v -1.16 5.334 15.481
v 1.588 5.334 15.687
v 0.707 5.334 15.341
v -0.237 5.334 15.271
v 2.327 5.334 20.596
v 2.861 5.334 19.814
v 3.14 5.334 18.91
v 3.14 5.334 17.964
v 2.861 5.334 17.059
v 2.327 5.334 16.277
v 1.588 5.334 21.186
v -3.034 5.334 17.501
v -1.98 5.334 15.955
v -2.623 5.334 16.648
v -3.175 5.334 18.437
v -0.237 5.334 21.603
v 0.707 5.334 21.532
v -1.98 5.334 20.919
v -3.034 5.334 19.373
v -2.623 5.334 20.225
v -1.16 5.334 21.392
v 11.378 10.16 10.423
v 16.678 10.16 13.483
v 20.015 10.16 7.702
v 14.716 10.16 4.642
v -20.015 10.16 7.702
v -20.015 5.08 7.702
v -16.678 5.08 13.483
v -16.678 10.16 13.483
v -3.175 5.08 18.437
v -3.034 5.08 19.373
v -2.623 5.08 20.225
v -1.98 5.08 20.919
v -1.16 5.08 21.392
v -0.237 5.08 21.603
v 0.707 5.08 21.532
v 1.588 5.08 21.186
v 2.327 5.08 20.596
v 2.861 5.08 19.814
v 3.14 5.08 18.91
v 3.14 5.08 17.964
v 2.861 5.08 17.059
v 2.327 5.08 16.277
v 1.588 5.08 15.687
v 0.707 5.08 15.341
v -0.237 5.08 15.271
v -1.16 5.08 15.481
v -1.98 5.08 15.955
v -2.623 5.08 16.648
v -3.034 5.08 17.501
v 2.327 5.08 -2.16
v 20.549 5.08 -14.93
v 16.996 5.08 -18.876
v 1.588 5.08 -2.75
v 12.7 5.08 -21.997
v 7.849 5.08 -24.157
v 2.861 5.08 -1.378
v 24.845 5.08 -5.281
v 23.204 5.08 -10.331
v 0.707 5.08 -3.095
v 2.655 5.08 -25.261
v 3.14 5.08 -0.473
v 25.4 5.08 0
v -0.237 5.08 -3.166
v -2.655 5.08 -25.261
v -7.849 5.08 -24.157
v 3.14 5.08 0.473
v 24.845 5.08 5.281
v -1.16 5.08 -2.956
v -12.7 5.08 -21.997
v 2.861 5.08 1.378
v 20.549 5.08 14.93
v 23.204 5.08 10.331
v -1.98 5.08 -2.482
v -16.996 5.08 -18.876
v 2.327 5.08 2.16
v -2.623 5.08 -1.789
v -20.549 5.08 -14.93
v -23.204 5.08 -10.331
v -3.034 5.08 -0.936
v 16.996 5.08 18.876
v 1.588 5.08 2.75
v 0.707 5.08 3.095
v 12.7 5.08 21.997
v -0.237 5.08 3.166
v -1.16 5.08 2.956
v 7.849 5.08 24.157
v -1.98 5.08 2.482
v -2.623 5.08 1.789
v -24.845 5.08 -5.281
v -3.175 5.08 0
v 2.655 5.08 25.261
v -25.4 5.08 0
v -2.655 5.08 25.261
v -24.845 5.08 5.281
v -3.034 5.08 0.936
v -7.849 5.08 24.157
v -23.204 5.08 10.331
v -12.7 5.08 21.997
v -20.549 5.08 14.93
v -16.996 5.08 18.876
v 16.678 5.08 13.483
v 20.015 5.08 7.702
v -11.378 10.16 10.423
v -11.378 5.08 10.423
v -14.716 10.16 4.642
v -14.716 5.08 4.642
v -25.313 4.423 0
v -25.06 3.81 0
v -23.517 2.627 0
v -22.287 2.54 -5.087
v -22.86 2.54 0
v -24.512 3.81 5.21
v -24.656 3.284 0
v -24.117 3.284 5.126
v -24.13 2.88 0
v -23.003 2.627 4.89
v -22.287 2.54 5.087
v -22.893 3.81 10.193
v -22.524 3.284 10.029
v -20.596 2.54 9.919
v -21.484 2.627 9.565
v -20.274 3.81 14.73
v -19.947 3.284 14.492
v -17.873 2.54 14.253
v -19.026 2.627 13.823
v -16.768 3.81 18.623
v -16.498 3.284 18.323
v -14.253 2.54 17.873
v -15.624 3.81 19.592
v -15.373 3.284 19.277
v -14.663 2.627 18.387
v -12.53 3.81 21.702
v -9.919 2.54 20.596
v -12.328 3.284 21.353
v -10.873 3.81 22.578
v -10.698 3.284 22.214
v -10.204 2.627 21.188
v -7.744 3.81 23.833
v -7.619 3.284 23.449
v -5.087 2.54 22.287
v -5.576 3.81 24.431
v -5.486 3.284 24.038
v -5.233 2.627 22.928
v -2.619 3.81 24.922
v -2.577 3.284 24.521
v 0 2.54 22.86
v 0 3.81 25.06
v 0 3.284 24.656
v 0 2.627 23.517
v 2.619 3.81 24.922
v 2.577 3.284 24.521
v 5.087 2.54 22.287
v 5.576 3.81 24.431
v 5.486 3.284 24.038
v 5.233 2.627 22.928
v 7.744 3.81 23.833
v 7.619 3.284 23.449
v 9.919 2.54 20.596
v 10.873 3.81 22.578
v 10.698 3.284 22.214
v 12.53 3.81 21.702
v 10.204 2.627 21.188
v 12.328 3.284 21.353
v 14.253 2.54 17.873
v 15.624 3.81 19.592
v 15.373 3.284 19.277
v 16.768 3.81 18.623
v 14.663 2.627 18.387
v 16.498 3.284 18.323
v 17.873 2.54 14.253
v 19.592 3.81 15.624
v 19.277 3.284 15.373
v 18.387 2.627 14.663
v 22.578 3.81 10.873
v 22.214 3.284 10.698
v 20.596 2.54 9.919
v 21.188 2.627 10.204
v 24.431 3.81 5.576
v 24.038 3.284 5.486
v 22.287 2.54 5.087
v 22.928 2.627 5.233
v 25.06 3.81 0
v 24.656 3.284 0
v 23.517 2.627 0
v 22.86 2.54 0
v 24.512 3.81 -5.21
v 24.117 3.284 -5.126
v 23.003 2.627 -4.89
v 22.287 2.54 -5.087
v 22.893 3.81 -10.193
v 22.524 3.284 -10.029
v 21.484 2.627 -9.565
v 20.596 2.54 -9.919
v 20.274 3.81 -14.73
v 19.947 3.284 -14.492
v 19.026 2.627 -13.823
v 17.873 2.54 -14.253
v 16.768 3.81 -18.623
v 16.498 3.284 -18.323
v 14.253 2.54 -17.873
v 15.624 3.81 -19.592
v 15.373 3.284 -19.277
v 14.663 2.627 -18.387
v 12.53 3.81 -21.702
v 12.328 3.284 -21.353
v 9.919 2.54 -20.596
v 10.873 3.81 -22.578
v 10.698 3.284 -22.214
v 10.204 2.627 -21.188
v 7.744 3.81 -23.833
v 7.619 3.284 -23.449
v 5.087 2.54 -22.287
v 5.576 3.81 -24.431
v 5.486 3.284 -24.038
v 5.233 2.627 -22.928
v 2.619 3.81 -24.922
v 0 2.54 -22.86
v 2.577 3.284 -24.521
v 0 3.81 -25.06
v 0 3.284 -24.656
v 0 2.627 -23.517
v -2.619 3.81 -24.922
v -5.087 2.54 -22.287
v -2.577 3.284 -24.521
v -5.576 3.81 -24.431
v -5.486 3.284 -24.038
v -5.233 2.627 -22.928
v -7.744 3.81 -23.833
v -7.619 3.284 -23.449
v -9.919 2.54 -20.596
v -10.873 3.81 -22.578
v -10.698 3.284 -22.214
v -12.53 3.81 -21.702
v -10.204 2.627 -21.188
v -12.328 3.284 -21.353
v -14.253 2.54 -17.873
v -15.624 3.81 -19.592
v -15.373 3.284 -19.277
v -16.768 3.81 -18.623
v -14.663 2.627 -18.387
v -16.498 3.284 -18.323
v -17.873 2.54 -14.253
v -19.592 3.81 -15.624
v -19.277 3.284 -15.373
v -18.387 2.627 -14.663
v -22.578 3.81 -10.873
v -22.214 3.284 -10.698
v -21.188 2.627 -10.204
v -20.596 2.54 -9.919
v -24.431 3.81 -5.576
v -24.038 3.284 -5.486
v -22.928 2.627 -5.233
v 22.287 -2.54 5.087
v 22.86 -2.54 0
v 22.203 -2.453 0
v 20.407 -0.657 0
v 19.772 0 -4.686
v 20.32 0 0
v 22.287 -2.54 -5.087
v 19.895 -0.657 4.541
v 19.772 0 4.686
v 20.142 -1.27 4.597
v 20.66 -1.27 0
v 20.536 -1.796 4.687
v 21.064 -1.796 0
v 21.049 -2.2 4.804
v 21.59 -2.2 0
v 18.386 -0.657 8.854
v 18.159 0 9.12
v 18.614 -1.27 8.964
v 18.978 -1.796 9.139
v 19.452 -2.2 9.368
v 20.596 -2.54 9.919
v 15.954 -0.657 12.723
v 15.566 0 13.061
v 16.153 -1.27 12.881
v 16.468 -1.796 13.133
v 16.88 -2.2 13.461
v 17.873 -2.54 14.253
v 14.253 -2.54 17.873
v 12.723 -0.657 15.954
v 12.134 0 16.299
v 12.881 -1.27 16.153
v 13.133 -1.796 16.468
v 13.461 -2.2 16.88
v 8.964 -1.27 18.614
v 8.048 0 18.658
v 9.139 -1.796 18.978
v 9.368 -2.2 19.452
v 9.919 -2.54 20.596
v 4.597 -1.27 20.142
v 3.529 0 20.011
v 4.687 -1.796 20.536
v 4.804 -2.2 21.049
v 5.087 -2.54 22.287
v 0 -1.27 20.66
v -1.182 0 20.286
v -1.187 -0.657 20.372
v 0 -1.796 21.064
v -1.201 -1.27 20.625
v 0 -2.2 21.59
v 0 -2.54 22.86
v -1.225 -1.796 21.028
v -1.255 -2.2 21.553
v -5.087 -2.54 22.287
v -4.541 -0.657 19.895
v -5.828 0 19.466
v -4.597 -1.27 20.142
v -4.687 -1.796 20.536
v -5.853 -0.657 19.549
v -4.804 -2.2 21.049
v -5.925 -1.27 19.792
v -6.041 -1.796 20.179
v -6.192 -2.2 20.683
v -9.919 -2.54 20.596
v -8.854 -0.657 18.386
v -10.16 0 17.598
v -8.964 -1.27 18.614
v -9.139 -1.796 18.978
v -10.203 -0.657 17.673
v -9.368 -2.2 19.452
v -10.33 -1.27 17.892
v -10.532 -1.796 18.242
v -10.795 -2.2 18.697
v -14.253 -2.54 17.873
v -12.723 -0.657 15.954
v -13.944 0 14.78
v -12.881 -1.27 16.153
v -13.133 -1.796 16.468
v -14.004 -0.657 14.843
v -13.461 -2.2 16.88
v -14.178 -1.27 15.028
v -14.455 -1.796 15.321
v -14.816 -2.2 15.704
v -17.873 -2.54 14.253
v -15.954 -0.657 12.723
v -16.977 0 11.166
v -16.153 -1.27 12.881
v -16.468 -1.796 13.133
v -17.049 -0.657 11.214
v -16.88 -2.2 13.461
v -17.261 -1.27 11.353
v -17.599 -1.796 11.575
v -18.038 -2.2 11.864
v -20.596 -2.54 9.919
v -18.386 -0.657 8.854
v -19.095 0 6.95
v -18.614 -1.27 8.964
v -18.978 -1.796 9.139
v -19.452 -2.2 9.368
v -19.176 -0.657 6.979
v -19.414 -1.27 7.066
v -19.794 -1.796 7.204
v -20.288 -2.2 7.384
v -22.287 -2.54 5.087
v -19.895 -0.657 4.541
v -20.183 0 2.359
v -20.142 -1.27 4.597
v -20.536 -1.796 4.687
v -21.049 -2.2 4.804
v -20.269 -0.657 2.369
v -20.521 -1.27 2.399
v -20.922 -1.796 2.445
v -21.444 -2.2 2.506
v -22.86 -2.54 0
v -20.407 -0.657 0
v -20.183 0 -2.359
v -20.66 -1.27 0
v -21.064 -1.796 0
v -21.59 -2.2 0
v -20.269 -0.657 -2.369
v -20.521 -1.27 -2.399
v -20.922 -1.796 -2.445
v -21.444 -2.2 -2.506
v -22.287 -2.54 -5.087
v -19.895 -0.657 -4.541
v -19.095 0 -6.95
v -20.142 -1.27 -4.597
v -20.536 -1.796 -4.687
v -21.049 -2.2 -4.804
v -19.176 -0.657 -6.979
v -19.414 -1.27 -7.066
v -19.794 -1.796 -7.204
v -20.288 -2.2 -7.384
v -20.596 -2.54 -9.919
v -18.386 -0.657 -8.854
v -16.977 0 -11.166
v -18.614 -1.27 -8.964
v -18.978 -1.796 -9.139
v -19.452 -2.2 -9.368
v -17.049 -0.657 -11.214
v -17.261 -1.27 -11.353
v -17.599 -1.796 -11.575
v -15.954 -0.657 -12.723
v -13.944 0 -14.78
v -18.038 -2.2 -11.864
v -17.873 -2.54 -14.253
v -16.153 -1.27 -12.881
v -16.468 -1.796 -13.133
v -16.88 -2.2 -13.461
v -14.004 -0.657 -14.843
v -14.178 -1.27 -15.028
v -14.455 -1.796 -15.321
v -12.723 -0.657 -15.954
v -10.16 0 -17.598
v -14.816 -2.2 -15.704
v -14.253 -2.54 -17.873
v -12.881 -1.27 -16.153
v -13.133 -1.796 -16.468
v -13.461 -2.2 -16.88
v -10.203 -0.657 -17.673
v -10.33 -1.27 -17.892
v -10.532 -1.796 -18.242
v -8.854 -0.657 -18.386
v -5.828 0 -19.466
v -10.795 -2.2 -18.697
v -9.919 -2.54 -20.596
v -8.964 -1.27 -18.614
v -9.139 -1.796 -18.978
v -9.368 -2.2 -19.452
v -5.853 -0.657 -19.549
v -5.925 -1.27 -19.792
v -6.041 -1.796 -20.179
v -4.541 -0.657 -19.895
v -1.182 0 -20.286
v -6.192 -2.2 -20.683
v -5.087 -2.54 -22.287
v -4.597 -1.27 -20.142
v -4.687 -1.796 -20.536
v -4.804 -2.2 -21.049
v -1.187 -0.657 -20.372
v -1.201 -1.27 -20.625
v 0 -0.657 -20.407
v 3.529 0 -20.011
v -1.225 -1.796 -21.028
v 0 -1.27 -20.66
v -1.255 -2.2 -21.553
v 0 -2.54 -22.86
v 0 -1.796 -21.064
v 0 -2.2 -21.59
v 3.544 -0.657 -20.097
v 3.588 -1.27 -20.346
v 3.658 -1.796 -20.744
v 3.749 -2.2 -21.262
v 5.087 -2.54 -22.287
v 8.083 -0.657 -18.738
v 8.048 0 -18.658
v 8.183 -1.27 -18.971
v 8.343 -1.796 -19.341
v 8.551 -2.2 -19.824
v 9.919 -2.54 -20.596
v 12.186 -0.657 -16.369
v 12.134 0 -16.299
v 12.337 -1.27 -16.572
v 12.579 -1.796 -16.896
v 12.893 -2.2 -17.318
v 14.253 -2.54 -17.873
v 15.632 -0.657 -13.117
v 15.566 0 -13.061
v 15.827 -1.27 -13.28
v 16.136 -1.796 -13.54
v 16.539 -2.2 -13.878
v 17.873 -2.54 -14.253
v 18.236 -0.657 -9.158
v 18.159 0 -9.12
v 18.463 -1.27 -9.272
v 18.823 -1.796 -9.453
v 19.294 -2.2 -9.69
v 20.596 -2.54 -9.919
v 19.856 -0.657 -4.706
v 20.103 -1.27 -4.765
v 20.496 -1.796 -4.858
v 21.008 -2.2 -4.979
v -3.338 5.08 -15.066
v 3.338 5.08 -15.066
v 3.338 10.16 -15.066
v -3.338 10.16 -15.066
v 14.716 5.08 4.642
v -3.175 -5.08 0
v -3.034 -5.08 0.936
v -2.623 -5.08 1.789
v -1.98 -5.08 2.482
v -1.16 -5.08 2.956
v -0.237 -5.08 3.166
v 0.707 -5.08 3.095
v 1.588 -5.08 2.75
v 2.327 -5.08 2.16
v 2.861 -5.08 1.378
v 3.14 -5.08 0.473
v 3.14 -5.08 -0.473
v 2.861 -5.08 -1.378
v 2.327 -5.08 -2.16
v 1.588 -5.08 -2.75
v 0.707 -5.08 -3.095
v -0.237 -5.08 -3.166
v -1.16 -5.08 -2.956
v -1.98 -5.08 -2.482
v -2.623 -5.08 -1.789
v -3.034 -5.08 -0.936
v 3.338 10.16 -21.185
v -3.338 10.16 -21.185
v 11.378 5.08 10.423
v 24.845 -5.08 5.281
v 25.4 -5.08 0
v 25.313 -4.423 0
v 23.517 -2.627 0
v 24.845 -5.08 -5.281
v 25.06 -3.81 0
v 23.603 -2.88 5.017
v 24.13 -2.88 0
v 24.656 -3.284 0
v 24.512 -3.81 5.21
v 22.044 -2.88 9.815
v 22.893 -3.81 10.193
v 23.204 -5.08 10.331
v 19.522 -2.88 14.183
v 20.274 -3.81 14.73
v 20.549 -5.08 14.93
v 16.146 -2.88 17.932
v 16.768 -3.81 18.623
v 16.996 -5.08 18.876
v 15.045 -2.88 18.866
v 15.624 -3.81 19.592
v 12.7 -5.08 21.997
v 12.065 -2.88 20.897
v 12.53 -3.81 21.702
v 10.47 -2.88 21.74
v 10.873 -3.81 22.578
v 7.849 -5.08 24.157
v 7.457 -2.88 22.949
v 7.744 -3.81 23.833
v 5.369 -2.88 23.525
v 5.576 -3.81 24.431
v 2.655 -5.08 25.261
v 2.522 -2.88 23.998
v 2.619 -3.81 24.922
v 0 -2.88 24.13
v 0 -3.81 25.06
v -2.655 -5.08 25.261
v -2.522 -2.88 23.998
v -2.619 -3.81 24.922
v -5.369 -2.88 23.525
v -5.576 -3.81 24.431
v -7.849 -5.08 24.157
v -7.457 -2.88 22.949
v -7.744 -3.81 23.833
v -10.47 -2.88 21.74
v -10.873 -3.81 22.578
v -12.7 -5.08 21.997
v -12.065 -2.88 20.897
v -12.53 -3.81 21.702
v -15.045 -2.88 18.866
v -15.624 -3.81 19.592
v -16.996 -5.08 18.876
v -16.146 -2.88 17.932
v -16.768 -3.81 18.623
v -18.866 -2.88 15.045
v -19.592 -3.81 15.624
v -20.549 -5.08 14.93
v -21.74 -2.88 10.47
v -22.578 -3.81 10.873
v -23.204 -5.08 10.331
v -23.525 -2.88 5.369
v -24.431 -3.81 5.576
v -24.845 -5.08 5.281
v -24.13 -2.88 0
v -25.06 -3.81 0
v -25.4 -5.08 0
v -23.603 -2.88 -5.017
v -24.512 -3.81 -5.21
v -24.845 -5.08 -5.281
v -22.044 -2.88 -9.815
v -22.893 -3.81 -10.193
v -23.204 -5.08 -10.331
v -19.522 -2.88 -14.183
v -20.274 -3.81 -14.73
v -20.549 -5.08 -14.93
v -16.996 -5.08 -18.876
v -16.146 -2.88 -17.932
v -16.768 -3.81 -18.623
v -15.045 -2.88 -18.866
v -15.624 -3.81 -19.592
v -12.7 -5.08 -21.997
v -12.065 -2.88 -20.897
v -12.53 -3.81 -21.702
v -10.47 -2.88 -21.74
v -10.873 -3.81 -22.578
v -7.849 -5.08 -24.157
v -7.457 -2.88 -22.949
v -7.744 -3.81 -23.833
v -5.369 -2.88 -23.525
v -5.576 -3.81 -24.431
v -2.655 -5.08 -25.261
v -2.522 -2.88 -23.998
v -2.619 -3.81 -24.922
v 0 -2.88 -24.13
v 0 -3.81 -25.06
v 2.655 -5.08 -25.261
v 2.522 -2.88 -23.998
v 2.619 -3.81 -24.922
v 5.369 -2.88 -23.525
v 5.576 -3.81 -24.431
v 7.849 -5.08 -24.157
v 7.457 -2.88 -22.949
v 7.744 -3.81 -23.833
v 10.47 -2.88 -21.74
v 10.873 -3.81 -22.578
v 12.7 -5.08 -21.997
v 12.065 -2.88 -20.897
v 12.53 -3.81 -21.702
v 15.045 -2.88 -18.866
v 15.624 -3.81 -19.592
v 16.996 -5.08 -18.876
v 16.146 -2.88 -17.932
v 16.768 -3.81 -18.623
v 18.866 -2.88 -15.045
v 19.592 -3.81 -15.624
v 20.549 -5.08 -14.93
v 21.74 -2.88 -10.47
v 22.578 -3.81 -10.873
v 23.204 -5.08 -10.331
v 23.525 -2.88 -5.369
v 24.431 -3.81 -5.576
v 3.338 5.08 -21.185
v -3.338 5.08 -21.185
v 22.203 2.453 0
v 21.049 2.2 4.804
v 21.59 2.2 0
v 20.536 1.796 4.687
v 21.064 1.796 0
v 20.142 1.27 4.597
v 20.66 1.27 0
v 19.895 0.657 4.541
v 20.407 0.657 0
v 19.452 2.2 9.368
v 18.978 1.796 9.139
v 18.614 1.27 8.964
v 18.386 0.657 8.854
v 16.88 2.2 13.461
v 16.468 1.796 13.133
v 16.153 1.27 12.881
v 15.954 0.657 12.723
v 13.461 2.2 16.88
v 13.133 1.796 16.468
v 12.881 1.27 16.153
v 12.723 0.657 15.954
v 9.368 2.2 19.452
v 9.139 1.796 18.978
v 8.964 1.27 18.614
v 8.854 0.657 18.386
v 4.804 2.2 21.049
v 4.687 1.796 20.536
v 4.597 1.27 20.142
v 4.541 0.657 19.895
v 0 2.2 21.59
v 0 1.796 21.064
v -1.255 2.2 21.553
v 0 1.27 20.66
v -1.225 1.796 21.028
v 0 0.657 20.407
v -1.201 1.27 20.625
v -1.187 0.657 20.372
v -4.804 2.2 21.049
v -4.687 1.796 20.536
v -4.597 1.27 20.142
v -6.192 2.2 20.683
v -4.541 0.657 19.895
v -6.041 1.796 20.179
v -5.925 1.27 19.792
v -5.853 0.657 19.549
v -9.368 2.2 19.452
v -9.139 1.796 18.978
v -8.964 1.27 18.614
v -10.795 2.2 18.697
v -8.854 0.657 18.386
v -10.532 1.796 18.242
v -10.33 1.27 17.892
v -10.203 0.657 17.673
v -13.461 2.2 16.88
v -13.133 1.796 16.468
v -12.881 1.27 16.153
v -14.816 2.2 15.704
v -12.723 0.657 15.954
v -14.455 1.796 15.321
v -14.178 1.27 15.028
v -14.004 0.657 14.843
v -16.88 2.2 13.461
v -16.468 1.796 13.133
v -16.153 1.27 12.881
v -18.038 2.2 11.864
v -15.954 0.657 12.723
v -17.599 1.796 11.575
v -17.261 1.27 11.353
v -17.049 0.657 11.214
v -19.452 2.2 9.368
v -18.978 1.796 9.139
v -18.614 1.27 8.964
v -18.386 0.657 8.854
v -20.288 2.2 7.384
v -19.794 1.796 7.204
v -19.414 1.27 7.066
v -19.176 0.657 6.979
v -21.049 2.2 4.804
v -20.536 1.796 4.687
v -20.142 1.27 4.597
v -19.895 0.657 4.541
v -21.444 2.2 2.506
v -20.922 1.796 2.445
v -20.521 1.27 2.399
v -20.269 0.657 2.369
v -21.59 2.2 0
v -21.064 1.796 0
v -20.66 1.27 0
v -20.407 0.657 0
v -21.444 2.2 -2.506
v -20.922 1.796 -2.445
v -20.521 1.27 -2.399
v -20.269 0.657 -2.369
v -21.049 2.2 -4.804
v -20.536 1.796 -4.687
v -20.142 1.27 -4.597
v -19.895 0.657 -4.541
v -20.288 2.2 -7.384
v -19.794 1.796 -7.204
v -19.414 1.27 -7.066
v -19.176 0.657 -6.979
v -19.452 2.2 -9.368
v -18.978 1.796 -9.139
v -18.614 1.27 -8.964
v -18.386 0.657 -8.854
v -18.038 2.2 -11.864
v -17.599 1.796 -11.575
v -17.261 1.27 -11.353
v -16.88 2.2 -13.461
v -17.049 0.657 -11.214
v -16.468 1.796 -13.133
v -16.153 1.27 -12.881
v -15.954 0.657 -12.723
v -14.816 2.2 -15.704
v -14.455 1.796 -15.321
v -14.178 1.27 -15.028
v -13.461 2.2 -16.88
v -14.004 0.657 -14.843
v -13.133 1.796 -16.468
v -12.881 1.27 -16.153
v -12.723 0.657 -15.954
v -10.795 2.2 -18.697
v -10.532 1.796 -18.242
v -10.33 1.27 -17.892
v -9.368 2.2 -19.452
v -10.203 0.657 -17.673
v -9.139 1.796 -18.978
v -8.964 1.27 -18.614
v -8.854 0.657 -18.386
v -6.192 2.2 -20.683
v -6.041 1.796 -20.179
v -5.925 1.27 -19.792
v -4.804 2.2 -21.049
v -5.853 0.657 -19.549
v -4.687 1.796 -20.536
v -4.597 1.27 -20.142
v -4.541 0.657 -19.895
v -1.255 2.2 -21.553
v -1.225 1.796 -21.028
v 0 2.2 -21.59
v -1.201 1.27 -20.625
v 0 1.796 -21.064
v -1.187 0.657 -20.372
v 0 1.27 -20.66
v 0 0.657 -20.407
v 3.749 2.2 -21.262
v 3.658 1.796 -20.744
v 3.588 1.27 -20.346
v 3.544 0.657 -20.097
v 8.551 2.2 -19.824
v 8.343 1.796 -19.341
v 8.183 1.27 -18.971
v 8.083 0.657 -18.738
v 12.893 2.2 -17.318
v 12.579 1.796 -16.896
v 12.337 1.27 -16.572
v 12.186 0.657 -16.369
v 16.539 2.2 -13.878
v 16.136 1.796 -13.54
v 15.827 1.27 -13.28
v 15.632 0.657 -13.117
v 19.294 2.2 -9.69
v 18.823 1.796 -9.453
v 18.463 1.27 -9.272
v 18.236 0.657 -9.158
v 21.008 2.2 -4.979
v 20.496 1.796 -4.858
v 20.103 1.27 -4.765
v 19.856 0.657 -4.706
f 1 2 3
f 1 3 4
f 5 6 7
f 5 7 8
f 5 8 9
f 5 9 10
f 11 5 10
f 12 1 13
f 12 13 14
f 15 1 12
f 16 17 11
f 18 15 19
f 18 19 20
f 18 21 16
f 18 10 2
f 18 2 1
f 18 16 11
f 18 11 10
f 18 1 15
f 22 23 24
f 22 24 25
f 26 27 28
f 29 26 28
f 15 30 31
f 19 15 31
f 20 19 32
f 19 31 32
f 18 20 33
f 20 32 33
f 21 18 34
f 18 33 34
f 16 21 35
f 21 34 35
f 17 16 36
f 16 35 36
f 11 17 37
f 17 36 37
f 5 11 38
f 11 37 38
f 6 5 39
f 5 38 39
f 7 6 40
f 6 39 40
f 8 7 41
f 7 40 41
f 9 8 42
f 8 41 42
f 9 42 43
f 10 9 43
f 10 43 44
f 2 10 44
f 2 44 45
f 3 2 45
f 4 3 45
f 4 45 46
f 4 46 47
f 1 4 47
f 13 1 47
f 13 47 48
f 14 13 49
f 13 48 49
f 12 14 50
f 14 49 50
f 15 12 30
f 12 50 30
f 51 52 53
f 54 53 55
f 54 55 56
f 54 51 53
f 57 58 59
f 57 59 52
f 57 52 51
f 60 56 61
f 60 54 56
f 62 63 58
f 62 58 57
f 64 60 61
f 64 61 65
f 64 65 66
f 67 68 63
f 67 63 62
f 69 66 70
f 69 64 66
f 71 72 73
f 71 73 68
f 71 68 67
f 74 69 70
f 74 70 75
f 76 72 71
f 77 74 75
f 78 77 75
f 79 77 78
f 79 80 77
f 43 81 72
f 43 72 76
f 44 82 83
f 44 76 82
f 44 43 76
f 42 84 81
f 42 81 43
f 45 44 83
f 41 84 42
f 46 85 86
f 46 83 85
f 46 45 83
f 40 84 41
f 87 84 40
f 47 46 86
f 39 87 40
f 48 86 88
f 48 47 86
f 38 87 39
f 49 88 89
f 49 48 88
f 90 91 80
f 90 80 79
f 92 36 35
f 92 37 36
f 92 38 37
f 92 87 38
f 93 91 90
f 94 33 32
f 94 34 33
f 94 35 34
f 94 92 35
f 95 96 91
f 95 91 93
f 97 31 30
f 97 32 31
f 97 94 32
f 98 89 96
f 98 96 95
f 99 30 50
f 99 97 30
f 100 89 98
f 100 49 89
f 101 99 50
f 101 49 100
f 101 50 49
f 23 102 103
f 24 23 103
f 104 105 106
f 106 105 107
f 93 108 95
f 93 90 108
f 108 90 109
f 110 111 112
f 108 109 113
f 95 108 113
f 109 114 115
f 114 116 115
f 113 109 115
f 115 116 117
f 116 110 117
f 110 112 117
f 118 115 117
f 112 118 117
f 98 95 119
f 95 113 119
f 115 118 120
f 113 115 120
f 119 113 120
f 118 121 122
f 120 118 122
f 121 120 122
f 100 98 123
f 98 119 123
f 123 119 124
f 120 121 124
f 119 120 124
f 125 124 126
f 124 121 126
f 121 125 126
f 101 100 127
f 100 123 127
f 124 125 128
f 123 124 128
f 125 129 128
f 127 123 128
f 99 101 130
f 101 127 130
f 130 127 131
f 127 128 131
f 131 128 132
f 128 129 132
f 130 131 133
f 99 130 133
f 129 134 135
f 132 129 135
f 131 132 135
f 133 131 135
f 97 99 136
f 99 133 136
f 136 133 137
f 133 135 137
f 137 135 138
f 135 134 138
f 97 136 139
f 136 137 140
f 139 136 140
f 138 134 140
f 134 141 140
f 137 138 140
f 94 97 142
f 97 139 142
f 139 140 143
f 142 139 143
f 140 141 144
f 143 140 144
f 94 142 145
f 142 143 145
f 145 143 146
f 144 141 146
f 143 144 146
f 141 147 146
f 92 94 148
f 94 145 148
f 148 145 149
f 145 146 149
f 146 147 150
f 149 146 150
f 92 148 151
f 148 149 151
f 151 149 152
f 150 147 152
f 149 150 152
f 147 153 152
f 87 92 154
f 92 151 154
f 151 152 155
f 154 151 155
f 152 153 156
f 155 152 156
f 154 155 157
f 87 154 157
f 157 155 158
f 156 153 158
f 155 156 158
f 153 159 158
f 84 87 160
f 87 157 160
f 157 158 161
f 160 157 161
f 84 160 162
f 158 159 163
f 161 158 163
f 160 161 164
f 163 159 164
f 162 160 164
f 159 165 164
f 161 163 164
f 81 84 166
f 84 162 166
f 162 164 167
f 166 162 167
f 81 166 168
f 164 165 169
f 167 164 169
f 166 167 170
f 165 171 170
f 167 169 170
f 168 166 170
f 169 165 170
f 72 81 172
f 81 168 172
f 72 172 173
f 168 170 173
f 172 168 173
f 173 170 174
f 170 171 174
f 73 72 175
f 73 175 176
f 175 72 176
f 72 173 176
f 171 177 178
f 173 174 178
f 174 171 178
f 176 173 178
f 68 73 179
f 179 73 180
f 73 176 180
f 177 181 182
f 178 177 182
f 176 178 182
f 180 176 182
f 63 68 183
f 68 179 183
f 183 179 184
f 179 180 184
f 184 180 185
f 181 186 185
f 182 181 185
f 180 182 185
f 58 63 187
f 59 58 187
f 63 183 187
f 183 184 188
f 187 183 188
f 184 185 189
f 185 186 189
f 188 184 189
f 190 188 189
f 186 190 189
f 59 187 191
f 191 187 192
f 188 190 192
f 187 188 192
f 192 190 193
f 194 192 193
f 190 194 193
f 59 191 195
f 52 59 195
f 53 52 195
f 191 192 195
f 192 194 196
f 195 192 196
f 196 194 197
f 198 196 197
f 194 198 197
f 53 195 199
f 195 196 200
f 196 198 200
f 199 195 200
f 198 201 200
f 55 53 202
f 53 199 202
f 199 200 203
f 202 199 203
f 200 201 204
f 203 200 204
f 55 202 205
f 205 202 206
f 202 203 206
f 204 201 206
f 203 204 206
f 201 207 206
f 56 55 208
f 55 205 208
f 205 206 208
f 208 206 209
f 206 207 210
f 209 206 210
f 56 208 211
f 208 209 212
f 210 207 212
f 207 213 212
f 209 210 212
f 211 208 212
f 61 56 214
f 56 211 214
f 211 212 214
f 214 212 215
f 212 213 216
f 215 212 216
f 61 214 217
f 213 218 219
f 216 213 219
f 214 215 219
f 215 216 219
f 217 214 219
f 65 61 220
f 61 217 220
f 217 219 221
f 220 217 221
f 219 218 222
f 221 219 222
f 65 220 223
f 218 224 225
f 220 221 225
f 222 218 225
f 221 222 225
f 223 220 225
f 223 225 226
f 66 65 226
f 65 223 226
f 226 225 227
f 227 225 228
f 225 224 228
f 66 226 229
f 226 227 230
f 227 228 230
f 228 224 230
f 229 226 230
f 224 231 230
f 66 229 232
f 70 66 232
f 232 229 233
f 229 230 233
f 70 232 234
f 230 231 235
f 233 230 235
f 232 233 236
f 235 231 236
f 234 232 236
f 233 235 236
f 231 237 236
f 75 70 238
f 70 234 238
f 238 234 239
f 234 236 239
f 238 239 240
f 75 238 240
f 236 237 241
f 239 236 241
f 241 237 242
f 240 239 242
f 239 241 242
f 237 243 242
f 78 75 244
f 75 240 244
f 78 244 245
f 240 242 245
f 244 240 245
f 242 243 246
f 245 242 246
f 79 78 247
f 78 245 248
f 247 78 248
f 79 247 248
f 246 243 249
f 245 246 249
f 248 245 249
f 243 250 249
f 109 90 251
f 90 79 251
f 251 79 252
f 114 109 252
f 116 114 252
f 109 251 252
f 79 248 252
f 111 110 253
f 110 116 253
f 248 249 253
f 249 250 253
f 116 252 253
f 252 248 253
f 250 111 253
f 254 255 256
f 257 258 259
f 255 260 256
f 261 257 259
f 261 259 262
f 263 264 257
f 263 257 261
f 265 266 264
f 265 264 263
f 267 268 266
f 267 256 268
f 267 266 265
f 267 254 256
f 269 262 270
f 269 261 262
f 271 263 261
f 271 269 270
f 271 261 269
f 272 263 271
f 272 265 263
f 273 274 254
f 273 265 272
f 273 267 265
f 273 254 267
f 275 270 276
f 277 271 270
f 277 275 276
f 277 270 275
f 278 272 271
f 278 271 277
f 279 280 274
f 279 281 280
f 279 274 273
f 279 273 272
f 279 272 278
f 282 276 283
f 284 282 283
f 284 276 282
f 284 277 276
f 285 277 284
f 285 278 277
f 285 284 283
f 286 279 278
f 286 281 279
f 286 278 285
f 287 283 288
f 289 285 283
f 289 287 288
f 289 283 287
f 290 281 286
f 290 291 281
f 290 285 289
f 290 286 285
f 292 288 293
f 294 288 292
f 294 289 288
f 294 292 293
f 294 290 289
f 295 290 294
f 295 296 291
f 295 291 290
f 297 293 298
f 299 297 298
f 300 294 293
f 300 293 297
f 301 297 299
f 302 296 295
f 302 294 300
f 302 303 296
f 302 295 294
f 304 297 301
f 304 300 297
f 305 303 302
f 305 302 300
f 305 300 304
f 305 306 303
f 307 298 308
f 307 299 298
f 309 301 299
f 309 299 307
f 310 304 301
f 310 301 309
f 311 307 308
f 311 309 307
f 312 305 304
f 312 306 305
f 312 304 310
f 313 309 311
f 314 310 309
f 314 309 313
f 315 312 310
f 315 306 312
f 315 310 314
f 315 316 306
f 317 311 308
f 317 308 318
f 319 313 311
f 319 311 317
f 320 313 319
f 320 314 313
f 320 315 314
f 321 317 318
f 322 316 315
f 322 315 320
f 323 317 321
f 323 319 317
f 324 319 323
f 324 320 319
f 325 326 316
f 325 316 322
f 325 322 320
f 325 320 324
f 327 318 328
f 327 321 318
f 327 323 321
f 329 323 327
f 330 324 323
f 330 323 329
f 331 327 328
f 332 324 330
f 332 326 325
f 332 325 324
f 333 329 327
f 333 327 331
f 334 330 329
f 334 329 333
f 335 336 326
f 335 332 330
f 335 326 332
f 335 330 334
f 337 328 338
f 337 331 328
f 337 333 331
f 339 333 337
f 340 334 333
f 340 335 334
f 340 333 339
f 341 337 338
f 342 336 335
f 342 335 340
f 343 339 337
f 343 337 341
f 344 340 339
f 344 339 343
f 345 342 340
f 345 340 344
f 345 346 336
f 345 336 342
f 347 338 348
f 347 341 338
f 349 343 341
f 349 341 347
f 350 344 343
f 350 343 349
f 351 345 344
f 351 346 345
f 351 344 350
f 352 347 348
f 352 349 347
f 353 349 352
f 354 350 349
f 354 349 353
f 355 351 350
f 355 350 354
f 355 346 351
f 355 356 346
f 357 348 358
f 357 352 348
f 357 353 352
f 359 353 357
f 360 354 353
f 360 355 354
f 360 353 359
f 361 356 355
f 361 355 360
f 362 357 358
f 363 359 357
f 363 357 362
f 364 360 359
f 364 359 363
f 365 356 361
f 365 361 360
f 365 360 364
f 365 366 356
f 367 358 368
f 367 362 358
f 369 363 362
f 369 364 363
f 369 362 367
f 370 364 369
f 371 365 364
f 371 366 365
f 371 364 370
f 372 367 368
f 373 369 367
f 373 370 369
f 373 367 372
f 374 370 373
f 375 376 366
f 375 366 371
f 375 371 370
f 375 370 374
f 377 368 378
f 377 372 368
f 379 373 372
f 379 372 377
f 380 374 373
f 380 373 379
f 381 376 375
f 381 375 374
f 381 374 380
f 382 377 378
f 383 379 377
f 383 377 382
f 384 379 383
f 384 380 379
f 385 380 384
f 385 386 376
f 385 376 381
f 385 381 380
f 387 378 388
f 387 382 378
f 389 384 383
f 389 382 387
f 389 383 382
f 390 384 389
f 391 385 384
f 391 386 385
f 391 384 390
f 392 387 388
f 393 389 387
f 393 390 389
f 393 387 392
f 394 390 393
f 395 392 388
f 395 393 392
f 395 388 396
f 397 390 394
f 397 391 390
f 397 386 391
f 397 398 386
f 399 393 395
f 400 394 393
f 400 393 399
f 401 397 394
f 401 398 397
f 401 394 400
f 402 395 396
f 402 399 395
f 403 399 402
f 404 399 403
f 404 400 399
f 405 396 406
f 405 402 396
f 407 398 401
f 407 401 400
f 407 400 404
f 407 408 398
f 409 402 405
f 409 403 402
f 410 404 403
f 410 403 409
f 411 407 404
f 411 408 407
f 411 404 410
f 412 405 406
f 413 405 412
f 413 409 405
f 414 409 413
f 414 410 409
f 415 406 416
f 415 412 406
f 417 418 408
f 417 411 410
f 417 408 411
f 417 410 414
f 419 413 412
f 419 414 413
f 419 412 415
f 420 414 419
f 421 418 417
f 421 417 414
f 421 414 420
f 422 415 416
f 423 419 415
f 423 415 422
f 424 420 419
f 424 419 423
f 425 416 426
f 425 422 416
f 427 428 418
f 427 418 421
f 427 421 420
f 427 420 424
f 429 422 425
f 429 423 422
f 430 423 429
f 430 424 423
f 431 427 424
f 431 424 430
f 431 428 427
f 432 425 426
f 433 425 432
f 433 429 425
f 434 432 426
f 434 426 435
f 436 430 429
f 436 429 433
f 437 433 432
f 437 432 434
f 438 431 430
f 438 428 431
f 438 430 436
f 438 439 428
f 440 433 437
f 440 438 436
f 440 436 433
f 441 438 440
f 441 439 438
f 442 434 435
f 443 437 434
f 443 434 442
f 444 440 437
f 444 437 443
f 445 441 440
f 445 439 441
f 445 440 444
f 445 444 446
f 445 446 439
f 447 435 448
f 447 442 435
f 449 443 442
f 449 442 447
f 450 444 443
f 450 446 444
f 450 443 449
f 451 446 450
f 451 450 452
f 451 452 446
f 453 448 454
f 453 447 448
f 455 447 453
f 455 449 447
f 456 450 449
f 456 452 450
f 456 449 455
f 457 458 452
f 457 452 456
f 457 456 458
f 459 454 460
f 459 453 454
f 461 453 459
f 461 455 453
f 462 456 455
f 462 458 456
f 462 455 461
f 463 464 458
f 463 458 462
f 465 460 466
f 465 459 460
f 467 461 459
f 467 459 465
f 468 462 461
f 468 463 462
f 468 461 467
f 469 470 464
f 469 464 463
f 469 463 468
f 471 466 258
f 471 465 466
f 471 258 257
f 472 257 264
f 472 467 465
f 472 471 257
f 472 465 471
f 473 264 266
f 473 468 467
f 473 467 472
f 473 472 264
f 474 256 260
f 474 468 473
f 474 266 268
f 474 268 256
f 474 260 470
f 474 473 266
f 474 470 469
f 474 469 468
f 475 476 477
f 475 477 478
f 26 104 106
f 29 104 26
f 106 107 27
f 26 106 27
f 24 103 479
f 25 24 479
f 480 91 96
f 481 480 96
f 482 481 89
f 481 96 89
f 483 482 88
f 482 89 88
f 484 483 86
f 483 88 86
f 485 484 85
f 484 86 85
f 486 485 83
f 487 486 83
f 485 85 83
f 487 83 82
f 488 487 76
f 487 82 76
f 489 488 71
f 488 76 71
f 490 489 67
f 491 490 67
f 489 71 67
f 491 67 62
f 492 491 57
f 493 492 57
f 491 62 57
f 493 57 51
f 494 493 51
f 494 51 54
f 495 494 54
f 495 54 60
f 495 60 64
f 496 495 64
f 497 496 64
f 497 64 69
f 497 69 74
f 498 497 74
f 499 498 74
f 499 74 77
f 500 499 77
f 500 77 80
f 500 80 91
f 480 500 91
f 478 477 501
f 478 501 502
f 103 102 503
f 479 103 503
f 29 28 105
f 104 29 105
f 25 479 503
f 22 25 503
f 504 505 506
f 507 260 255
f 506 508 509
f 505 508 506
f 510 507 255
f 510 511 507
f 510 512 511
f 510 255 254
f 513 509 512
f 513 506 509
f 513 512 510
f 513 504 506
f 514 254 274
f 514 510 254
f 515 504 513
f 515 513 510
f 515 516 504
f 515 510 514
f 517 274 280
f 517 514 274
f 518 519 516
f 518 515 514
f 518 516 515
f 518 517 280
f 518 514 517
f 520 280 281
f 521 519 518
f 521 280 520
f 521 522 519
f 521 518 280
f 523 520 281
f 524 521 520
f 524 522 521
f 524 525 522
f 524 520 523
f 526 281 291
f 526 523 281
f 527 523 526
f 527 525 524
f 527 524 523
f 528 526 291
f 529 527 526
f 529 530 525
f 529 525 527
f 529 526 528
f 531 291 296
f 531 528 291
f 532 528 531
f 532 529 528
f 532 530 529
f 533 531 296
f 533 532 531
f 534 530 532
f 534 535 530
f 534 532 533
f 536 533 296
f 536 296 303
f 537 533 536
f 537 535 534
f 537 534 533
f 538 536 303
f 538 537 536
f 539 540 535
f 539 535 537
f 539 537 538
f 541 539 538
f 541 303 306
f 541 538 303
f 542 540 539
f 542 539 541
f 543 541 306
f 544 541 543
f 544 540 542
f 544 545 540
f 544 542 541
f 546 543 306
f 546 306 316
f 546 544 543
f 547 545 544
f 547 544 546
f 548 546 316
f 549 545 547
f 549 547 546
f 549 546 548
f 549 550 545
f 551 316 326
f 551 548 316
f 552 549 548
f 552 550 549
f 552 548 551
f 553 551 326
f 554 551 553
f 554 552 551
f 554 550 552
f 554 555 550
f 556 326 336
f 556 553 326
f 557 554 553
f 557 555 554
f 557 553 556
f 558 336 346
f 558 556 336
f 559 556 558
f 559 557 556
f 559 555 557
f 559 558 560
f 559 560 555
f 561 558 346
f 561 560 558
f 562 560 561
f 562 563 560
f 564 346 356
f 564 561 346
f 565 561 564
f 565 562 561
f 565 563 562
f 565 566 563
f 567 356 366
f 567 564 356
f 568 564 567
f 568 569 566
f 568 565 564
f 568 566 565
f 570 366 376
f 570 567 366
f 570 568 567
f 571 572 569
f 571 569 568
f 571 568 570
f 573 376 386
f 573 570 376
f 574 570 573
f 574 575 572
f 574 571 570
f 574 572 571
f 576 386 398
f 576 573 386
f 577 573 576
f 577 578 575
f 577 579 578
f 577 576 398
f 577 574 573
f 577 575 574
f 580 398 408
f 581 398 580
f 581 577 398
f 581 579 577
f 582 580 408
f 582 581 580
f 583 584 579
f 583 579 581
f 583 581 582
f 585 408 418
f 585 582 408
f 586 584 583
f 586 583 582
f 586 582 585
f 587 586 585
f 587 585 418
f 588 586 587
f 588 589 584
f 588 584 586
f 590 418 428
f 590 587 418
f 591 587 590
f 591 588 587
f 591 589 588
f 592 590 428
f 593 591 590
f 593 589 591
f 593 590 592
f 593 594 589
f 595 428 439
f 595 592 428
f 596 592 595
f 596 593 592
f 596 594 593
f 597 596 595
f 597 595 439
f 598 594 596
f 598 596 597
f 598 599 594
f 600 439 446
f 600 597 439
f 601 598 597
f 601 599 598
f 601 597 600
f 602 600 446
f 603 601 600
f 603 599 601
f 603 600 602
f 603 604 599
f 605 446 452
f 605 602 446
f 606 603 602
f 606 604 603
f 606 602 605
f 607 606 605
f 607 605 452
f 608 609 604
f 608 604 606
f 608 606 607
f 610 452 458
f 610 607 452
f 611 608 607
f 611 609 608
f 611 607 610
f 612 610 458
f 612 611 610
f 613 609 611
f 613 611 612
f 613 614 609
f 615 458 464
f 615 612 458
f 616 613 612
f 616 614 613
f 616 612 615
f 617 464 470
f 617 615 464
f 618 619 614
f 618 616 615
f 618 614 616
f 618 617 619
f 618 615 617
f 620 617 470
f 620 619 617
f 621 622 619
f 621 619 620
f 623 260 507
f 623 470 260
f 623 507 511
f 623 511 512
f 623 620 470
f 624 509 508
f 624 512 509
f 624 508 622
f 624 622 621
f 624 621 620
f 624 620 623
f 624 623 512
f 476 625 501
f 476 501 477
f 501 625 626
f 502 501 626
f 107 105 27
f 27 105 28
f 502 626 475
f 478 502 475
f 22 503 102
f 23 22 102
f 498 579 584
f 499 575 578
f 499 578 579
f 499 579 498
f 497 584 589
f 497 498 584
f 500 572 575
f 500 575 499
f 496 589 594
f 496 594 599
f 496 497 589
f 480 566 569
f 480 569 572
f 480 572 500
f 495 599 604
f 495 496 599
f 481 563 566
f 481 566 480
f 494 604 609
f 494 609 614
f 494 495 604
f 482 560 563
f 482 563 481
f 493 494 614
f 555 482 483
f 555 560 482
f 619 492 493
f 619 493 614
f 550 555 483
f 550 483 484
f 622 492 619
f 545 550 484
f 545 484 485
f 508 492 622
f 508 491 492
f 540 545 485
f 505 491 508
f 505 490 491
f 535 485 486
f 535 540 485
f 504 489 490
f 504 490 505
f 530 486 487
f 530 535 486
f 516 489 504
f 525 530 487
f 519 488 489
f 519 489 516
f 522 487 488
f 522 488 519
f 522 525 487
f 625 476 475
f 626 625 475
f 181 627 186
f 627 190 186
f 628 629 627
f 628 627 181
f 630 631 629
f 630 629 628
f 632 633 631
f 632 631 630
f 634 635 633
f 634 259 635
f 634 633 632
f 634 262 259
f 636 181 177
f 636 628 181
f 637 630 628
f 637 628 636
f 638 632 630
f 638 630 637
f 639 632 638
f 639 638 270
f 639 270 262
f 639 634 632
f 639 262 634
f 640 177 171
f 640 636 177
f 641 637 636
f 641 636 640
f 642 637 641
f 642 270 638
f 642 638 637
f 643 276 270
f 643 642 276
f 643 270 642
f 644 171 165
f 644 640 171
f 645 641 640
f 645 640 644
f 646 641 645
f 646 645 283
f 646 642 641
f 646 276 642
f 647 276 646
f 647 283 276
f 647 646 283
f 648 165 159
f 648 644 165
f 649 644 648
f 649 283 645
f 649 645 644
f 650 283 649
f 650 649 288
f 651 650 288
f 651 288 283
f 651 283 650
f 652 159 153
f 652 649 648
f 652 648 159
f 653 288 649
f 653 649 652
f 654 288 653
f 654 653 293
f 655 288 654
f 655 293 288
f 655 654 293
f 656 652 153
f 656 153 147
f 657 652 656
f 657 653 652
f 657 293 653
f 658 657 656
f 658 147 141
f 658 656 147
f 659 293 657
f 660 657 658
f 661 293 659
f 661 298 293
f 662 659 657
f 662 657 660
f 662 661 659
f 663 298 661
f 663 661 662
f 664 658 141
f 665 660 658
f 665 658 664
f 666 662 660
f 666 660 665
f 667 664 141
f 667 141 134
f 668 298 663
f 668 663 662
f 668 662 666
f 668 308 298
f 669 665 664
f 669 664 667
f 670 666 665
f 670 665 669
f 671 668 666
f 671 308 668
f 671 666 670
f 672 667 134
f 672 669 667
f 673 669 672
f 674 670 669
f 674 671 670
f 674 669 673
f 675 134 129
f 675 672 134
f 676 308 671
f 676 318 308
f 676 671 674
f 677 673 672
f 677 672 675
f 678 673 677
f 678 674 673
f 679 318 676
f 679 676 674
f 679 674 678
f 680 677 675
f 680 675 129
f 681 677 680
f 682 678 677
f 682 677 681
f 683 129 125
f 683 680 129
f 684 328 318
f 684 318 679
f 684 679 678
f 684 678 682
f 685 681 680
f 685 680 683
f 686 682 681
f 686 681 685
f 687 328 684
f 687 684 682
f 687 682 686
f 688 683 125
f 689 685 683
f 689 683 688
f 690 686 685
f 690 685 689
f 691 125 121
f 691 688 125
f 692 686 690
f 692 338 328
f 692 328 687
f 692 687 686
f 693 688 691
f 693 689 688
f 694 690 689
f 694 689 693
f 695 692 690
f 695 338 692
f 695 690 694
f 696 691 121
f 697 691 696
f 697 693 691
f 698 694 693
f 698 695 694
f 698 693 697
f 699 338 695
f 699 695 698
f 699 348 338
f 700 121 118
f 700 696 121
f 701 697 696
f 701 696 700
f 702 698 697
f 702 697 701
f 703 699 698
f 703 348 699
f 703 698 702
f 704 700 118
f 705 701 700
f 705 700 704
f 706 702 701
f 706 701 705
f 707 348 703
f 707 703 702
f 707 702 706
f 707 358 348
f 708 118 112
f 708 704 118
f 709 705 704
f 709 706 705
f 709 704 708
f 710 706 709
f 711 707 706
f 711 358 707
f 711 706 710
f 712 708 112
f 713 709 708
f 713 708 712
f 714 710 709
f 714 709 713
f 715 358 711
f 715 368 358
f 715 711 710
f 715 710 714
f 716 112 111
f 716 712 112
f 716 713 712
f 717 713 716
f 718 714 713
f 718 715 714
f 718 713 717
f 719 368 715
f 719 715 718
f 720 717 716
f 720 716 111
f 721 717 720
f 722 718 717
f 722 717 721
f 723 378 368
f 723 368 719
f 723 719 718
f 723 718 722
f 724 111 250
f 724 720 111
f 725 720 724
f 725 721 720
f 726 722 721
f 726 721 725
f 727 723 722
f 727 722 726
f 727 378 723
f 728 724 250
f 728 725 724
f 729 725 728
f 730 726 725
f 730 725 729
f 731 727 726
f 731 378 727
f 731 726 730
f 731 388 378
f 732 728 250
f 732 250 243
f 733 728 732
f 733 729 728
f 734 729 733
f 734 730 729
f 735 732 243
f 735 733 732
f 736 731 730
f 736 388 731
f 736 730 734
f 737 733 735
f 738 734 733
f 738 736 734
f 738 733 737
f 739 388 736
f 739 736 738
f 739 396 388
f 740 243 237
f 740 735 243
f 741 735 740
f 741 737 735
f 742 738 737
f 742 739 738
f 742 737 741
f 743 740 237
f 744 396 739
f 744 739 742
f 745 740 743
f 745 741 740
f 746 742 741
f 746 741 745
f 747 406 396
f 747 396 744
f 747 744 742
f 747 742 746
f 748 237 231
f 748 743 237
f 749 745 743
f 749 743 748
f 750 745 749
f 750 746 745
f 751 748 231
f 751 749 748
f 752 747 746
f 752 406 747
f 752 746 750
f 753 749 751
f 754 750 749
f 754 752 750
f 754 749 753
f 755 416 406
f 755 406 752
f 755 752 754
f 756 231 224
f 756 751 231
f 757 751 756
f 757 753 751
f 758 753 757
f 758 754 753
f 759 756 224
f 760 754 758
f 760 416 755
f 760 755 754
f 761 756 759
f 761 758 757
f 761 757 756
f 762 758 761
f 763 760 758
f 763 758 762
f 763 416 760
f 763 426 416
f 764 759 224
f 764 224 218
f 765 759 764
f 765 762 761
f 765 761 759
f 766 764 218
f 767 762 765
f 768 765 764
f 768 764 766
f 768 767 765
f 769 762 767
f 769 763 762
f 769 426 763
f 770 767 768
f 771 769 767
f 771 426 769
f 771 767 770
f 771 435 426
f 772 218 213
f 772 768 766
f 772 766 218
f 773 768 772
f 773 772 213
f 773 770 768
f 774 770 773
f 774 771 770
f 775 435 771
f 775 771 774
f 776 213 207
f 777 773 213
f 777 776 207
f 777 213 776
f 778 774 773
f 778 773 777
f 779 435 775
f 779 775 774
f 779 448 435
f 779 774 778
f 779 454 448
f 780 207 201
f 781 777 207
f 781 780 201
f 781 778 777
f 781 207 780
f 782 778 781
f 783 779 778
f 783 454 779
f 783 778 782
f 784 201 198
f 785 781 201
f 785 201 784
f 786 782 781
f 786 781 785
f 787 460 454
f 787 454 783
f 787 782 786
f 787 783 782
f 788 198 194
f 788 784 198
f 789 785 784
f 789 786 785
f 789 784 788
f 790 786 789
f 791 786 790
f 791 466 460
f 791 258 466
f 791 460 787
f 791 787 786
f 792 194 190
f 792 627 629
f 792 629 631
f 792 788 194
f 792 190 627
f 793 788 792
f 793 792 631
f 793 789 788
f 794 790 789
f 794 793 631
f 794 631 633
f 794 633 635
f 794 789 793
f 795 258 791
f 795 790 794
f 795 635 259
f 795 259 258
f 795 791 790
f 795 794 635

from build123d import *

# Parameters (mm, degrees)
F0_R      = 20.32
F1_DEPTH  = 2.54
F2_R      = 25.4
F3_DEPTH  = 2.54
F4_R      = 25.4
F5_DEPTH  = 2.54
F6_R      = 2.53999
F7_R      = 3.175
F8_DEPTH  = 25.4
F9_DEPTH  = 0.254
F11_DEPTH = 5.08
F10_W     = 6.6752280109
F10_H     = 6.1189569533


# Not quite as in the source:
# - a fillet or chamfer is up to 0.001 mm smaller than in the source, because OpenCascade refuses the exact size


with BuildPart() as f1:
    # F0 (on Front) → F1 (new body, symmetric)
    with BuildSketch(Plane.XZ):
        Circle(F0_R)
    extrude(amount=F1_DEPTH, both=True)

    # F2 (on face) → F3 (join)
    with BuildSketch(Plane.XZ.offset(2.54)):
        Circle(F2_R)
    extrude(amount=F3_DEPTH)

    # F4 (on face) → F5 (join)
    with BuildSketch(Plane(origin=(0, 2.54, 0), x_dir=(-1, 0, 0), z_dir=(0, 1, 0))):
        Circle(F4_R)
    extrude(amount=F5_DEPTH)

    # F6 (radius 2.54 in the source; OpenCascade refuses exactly that, so slightly less here)
    f6_edges = [f1.edges().sort_by_distance(p)[0] for p in [
        (-20.32, 2.54, 0),
        (20.32, 0, 0),
        (-20.32, -2.54, 0),
        (25.4, 2.54, 0),
        (-25.4, -2.54, 0),
    ]]
    fillet(f6_edges, radius=F6_R)

    # F7 (on face) → F8 (cut)
    with BuildSketch(Plane(origin=(0, 5.08, 0), x_dir=(-1, 0, 0), z_dir=(0, 1, 0))):
        Circle(F7_R)
    extrude(amount=-F8_DEPTH, mode=Mode.SUBTRACT)

    # F7 (on face) → F9 (join)
    with BuildSketch(Plane(origin=(0, 5.08, 0), x_dir=(-1, 0, 0), z_dir=(0, 1, 0))):
        with Locations((0, 18.4368621558)):
            Circle(F7_R)
    extrude(amount=F9_DEPTH)


with BuildPart() as f11:
    # F10 (on face) → F11 (new body)
    with BuildSketch(Plane(origin=(0, 5.08, 0), x_dir=(-1, 0, 0), z_dir=(0, 1, 0))):
        Polygon((20.0151837326, 7.7018270269), (16.6775697272, 13.4827440604), (11.378397561, 10.4232655838), (14.7160115664, 4.6423485503), align=None)
    extrude(amount=F11_DEPTH)


with BuildPart() as f11b:
    # F10 (on face) → F11, piece 2 (new body)
    with BuildSketch(Plane(origin=(0, 5.08, 0), x_dir=(-1, 0, 0), z_dir=(0, 1, 0))):
        with Locations((0, -18.1250926107)):
            Rectangle(F10_W, F10_H)
    extrude(amount=F11_DEPTH)


with BuildPart() as f11c:
    # F10 (on face) → F11, piece 3 (new body)
    with BuildSketch(Plane(origin=(0, 5.08, 0), x_dir=(-1, 0, 0), z_dir=(0, 1, 0))):
        Polygon((-16.6775697272, 13.4827440604), (-20.0151837326, 7.7018270269), (-14.7160115664, 4.6423485503), (-11.378397561, 10.4232655838), align=None)
    extrude(amount=F11_DEPTH)


solid = Compound([f1.part, f11.part, f11b.part, f11c.part])
